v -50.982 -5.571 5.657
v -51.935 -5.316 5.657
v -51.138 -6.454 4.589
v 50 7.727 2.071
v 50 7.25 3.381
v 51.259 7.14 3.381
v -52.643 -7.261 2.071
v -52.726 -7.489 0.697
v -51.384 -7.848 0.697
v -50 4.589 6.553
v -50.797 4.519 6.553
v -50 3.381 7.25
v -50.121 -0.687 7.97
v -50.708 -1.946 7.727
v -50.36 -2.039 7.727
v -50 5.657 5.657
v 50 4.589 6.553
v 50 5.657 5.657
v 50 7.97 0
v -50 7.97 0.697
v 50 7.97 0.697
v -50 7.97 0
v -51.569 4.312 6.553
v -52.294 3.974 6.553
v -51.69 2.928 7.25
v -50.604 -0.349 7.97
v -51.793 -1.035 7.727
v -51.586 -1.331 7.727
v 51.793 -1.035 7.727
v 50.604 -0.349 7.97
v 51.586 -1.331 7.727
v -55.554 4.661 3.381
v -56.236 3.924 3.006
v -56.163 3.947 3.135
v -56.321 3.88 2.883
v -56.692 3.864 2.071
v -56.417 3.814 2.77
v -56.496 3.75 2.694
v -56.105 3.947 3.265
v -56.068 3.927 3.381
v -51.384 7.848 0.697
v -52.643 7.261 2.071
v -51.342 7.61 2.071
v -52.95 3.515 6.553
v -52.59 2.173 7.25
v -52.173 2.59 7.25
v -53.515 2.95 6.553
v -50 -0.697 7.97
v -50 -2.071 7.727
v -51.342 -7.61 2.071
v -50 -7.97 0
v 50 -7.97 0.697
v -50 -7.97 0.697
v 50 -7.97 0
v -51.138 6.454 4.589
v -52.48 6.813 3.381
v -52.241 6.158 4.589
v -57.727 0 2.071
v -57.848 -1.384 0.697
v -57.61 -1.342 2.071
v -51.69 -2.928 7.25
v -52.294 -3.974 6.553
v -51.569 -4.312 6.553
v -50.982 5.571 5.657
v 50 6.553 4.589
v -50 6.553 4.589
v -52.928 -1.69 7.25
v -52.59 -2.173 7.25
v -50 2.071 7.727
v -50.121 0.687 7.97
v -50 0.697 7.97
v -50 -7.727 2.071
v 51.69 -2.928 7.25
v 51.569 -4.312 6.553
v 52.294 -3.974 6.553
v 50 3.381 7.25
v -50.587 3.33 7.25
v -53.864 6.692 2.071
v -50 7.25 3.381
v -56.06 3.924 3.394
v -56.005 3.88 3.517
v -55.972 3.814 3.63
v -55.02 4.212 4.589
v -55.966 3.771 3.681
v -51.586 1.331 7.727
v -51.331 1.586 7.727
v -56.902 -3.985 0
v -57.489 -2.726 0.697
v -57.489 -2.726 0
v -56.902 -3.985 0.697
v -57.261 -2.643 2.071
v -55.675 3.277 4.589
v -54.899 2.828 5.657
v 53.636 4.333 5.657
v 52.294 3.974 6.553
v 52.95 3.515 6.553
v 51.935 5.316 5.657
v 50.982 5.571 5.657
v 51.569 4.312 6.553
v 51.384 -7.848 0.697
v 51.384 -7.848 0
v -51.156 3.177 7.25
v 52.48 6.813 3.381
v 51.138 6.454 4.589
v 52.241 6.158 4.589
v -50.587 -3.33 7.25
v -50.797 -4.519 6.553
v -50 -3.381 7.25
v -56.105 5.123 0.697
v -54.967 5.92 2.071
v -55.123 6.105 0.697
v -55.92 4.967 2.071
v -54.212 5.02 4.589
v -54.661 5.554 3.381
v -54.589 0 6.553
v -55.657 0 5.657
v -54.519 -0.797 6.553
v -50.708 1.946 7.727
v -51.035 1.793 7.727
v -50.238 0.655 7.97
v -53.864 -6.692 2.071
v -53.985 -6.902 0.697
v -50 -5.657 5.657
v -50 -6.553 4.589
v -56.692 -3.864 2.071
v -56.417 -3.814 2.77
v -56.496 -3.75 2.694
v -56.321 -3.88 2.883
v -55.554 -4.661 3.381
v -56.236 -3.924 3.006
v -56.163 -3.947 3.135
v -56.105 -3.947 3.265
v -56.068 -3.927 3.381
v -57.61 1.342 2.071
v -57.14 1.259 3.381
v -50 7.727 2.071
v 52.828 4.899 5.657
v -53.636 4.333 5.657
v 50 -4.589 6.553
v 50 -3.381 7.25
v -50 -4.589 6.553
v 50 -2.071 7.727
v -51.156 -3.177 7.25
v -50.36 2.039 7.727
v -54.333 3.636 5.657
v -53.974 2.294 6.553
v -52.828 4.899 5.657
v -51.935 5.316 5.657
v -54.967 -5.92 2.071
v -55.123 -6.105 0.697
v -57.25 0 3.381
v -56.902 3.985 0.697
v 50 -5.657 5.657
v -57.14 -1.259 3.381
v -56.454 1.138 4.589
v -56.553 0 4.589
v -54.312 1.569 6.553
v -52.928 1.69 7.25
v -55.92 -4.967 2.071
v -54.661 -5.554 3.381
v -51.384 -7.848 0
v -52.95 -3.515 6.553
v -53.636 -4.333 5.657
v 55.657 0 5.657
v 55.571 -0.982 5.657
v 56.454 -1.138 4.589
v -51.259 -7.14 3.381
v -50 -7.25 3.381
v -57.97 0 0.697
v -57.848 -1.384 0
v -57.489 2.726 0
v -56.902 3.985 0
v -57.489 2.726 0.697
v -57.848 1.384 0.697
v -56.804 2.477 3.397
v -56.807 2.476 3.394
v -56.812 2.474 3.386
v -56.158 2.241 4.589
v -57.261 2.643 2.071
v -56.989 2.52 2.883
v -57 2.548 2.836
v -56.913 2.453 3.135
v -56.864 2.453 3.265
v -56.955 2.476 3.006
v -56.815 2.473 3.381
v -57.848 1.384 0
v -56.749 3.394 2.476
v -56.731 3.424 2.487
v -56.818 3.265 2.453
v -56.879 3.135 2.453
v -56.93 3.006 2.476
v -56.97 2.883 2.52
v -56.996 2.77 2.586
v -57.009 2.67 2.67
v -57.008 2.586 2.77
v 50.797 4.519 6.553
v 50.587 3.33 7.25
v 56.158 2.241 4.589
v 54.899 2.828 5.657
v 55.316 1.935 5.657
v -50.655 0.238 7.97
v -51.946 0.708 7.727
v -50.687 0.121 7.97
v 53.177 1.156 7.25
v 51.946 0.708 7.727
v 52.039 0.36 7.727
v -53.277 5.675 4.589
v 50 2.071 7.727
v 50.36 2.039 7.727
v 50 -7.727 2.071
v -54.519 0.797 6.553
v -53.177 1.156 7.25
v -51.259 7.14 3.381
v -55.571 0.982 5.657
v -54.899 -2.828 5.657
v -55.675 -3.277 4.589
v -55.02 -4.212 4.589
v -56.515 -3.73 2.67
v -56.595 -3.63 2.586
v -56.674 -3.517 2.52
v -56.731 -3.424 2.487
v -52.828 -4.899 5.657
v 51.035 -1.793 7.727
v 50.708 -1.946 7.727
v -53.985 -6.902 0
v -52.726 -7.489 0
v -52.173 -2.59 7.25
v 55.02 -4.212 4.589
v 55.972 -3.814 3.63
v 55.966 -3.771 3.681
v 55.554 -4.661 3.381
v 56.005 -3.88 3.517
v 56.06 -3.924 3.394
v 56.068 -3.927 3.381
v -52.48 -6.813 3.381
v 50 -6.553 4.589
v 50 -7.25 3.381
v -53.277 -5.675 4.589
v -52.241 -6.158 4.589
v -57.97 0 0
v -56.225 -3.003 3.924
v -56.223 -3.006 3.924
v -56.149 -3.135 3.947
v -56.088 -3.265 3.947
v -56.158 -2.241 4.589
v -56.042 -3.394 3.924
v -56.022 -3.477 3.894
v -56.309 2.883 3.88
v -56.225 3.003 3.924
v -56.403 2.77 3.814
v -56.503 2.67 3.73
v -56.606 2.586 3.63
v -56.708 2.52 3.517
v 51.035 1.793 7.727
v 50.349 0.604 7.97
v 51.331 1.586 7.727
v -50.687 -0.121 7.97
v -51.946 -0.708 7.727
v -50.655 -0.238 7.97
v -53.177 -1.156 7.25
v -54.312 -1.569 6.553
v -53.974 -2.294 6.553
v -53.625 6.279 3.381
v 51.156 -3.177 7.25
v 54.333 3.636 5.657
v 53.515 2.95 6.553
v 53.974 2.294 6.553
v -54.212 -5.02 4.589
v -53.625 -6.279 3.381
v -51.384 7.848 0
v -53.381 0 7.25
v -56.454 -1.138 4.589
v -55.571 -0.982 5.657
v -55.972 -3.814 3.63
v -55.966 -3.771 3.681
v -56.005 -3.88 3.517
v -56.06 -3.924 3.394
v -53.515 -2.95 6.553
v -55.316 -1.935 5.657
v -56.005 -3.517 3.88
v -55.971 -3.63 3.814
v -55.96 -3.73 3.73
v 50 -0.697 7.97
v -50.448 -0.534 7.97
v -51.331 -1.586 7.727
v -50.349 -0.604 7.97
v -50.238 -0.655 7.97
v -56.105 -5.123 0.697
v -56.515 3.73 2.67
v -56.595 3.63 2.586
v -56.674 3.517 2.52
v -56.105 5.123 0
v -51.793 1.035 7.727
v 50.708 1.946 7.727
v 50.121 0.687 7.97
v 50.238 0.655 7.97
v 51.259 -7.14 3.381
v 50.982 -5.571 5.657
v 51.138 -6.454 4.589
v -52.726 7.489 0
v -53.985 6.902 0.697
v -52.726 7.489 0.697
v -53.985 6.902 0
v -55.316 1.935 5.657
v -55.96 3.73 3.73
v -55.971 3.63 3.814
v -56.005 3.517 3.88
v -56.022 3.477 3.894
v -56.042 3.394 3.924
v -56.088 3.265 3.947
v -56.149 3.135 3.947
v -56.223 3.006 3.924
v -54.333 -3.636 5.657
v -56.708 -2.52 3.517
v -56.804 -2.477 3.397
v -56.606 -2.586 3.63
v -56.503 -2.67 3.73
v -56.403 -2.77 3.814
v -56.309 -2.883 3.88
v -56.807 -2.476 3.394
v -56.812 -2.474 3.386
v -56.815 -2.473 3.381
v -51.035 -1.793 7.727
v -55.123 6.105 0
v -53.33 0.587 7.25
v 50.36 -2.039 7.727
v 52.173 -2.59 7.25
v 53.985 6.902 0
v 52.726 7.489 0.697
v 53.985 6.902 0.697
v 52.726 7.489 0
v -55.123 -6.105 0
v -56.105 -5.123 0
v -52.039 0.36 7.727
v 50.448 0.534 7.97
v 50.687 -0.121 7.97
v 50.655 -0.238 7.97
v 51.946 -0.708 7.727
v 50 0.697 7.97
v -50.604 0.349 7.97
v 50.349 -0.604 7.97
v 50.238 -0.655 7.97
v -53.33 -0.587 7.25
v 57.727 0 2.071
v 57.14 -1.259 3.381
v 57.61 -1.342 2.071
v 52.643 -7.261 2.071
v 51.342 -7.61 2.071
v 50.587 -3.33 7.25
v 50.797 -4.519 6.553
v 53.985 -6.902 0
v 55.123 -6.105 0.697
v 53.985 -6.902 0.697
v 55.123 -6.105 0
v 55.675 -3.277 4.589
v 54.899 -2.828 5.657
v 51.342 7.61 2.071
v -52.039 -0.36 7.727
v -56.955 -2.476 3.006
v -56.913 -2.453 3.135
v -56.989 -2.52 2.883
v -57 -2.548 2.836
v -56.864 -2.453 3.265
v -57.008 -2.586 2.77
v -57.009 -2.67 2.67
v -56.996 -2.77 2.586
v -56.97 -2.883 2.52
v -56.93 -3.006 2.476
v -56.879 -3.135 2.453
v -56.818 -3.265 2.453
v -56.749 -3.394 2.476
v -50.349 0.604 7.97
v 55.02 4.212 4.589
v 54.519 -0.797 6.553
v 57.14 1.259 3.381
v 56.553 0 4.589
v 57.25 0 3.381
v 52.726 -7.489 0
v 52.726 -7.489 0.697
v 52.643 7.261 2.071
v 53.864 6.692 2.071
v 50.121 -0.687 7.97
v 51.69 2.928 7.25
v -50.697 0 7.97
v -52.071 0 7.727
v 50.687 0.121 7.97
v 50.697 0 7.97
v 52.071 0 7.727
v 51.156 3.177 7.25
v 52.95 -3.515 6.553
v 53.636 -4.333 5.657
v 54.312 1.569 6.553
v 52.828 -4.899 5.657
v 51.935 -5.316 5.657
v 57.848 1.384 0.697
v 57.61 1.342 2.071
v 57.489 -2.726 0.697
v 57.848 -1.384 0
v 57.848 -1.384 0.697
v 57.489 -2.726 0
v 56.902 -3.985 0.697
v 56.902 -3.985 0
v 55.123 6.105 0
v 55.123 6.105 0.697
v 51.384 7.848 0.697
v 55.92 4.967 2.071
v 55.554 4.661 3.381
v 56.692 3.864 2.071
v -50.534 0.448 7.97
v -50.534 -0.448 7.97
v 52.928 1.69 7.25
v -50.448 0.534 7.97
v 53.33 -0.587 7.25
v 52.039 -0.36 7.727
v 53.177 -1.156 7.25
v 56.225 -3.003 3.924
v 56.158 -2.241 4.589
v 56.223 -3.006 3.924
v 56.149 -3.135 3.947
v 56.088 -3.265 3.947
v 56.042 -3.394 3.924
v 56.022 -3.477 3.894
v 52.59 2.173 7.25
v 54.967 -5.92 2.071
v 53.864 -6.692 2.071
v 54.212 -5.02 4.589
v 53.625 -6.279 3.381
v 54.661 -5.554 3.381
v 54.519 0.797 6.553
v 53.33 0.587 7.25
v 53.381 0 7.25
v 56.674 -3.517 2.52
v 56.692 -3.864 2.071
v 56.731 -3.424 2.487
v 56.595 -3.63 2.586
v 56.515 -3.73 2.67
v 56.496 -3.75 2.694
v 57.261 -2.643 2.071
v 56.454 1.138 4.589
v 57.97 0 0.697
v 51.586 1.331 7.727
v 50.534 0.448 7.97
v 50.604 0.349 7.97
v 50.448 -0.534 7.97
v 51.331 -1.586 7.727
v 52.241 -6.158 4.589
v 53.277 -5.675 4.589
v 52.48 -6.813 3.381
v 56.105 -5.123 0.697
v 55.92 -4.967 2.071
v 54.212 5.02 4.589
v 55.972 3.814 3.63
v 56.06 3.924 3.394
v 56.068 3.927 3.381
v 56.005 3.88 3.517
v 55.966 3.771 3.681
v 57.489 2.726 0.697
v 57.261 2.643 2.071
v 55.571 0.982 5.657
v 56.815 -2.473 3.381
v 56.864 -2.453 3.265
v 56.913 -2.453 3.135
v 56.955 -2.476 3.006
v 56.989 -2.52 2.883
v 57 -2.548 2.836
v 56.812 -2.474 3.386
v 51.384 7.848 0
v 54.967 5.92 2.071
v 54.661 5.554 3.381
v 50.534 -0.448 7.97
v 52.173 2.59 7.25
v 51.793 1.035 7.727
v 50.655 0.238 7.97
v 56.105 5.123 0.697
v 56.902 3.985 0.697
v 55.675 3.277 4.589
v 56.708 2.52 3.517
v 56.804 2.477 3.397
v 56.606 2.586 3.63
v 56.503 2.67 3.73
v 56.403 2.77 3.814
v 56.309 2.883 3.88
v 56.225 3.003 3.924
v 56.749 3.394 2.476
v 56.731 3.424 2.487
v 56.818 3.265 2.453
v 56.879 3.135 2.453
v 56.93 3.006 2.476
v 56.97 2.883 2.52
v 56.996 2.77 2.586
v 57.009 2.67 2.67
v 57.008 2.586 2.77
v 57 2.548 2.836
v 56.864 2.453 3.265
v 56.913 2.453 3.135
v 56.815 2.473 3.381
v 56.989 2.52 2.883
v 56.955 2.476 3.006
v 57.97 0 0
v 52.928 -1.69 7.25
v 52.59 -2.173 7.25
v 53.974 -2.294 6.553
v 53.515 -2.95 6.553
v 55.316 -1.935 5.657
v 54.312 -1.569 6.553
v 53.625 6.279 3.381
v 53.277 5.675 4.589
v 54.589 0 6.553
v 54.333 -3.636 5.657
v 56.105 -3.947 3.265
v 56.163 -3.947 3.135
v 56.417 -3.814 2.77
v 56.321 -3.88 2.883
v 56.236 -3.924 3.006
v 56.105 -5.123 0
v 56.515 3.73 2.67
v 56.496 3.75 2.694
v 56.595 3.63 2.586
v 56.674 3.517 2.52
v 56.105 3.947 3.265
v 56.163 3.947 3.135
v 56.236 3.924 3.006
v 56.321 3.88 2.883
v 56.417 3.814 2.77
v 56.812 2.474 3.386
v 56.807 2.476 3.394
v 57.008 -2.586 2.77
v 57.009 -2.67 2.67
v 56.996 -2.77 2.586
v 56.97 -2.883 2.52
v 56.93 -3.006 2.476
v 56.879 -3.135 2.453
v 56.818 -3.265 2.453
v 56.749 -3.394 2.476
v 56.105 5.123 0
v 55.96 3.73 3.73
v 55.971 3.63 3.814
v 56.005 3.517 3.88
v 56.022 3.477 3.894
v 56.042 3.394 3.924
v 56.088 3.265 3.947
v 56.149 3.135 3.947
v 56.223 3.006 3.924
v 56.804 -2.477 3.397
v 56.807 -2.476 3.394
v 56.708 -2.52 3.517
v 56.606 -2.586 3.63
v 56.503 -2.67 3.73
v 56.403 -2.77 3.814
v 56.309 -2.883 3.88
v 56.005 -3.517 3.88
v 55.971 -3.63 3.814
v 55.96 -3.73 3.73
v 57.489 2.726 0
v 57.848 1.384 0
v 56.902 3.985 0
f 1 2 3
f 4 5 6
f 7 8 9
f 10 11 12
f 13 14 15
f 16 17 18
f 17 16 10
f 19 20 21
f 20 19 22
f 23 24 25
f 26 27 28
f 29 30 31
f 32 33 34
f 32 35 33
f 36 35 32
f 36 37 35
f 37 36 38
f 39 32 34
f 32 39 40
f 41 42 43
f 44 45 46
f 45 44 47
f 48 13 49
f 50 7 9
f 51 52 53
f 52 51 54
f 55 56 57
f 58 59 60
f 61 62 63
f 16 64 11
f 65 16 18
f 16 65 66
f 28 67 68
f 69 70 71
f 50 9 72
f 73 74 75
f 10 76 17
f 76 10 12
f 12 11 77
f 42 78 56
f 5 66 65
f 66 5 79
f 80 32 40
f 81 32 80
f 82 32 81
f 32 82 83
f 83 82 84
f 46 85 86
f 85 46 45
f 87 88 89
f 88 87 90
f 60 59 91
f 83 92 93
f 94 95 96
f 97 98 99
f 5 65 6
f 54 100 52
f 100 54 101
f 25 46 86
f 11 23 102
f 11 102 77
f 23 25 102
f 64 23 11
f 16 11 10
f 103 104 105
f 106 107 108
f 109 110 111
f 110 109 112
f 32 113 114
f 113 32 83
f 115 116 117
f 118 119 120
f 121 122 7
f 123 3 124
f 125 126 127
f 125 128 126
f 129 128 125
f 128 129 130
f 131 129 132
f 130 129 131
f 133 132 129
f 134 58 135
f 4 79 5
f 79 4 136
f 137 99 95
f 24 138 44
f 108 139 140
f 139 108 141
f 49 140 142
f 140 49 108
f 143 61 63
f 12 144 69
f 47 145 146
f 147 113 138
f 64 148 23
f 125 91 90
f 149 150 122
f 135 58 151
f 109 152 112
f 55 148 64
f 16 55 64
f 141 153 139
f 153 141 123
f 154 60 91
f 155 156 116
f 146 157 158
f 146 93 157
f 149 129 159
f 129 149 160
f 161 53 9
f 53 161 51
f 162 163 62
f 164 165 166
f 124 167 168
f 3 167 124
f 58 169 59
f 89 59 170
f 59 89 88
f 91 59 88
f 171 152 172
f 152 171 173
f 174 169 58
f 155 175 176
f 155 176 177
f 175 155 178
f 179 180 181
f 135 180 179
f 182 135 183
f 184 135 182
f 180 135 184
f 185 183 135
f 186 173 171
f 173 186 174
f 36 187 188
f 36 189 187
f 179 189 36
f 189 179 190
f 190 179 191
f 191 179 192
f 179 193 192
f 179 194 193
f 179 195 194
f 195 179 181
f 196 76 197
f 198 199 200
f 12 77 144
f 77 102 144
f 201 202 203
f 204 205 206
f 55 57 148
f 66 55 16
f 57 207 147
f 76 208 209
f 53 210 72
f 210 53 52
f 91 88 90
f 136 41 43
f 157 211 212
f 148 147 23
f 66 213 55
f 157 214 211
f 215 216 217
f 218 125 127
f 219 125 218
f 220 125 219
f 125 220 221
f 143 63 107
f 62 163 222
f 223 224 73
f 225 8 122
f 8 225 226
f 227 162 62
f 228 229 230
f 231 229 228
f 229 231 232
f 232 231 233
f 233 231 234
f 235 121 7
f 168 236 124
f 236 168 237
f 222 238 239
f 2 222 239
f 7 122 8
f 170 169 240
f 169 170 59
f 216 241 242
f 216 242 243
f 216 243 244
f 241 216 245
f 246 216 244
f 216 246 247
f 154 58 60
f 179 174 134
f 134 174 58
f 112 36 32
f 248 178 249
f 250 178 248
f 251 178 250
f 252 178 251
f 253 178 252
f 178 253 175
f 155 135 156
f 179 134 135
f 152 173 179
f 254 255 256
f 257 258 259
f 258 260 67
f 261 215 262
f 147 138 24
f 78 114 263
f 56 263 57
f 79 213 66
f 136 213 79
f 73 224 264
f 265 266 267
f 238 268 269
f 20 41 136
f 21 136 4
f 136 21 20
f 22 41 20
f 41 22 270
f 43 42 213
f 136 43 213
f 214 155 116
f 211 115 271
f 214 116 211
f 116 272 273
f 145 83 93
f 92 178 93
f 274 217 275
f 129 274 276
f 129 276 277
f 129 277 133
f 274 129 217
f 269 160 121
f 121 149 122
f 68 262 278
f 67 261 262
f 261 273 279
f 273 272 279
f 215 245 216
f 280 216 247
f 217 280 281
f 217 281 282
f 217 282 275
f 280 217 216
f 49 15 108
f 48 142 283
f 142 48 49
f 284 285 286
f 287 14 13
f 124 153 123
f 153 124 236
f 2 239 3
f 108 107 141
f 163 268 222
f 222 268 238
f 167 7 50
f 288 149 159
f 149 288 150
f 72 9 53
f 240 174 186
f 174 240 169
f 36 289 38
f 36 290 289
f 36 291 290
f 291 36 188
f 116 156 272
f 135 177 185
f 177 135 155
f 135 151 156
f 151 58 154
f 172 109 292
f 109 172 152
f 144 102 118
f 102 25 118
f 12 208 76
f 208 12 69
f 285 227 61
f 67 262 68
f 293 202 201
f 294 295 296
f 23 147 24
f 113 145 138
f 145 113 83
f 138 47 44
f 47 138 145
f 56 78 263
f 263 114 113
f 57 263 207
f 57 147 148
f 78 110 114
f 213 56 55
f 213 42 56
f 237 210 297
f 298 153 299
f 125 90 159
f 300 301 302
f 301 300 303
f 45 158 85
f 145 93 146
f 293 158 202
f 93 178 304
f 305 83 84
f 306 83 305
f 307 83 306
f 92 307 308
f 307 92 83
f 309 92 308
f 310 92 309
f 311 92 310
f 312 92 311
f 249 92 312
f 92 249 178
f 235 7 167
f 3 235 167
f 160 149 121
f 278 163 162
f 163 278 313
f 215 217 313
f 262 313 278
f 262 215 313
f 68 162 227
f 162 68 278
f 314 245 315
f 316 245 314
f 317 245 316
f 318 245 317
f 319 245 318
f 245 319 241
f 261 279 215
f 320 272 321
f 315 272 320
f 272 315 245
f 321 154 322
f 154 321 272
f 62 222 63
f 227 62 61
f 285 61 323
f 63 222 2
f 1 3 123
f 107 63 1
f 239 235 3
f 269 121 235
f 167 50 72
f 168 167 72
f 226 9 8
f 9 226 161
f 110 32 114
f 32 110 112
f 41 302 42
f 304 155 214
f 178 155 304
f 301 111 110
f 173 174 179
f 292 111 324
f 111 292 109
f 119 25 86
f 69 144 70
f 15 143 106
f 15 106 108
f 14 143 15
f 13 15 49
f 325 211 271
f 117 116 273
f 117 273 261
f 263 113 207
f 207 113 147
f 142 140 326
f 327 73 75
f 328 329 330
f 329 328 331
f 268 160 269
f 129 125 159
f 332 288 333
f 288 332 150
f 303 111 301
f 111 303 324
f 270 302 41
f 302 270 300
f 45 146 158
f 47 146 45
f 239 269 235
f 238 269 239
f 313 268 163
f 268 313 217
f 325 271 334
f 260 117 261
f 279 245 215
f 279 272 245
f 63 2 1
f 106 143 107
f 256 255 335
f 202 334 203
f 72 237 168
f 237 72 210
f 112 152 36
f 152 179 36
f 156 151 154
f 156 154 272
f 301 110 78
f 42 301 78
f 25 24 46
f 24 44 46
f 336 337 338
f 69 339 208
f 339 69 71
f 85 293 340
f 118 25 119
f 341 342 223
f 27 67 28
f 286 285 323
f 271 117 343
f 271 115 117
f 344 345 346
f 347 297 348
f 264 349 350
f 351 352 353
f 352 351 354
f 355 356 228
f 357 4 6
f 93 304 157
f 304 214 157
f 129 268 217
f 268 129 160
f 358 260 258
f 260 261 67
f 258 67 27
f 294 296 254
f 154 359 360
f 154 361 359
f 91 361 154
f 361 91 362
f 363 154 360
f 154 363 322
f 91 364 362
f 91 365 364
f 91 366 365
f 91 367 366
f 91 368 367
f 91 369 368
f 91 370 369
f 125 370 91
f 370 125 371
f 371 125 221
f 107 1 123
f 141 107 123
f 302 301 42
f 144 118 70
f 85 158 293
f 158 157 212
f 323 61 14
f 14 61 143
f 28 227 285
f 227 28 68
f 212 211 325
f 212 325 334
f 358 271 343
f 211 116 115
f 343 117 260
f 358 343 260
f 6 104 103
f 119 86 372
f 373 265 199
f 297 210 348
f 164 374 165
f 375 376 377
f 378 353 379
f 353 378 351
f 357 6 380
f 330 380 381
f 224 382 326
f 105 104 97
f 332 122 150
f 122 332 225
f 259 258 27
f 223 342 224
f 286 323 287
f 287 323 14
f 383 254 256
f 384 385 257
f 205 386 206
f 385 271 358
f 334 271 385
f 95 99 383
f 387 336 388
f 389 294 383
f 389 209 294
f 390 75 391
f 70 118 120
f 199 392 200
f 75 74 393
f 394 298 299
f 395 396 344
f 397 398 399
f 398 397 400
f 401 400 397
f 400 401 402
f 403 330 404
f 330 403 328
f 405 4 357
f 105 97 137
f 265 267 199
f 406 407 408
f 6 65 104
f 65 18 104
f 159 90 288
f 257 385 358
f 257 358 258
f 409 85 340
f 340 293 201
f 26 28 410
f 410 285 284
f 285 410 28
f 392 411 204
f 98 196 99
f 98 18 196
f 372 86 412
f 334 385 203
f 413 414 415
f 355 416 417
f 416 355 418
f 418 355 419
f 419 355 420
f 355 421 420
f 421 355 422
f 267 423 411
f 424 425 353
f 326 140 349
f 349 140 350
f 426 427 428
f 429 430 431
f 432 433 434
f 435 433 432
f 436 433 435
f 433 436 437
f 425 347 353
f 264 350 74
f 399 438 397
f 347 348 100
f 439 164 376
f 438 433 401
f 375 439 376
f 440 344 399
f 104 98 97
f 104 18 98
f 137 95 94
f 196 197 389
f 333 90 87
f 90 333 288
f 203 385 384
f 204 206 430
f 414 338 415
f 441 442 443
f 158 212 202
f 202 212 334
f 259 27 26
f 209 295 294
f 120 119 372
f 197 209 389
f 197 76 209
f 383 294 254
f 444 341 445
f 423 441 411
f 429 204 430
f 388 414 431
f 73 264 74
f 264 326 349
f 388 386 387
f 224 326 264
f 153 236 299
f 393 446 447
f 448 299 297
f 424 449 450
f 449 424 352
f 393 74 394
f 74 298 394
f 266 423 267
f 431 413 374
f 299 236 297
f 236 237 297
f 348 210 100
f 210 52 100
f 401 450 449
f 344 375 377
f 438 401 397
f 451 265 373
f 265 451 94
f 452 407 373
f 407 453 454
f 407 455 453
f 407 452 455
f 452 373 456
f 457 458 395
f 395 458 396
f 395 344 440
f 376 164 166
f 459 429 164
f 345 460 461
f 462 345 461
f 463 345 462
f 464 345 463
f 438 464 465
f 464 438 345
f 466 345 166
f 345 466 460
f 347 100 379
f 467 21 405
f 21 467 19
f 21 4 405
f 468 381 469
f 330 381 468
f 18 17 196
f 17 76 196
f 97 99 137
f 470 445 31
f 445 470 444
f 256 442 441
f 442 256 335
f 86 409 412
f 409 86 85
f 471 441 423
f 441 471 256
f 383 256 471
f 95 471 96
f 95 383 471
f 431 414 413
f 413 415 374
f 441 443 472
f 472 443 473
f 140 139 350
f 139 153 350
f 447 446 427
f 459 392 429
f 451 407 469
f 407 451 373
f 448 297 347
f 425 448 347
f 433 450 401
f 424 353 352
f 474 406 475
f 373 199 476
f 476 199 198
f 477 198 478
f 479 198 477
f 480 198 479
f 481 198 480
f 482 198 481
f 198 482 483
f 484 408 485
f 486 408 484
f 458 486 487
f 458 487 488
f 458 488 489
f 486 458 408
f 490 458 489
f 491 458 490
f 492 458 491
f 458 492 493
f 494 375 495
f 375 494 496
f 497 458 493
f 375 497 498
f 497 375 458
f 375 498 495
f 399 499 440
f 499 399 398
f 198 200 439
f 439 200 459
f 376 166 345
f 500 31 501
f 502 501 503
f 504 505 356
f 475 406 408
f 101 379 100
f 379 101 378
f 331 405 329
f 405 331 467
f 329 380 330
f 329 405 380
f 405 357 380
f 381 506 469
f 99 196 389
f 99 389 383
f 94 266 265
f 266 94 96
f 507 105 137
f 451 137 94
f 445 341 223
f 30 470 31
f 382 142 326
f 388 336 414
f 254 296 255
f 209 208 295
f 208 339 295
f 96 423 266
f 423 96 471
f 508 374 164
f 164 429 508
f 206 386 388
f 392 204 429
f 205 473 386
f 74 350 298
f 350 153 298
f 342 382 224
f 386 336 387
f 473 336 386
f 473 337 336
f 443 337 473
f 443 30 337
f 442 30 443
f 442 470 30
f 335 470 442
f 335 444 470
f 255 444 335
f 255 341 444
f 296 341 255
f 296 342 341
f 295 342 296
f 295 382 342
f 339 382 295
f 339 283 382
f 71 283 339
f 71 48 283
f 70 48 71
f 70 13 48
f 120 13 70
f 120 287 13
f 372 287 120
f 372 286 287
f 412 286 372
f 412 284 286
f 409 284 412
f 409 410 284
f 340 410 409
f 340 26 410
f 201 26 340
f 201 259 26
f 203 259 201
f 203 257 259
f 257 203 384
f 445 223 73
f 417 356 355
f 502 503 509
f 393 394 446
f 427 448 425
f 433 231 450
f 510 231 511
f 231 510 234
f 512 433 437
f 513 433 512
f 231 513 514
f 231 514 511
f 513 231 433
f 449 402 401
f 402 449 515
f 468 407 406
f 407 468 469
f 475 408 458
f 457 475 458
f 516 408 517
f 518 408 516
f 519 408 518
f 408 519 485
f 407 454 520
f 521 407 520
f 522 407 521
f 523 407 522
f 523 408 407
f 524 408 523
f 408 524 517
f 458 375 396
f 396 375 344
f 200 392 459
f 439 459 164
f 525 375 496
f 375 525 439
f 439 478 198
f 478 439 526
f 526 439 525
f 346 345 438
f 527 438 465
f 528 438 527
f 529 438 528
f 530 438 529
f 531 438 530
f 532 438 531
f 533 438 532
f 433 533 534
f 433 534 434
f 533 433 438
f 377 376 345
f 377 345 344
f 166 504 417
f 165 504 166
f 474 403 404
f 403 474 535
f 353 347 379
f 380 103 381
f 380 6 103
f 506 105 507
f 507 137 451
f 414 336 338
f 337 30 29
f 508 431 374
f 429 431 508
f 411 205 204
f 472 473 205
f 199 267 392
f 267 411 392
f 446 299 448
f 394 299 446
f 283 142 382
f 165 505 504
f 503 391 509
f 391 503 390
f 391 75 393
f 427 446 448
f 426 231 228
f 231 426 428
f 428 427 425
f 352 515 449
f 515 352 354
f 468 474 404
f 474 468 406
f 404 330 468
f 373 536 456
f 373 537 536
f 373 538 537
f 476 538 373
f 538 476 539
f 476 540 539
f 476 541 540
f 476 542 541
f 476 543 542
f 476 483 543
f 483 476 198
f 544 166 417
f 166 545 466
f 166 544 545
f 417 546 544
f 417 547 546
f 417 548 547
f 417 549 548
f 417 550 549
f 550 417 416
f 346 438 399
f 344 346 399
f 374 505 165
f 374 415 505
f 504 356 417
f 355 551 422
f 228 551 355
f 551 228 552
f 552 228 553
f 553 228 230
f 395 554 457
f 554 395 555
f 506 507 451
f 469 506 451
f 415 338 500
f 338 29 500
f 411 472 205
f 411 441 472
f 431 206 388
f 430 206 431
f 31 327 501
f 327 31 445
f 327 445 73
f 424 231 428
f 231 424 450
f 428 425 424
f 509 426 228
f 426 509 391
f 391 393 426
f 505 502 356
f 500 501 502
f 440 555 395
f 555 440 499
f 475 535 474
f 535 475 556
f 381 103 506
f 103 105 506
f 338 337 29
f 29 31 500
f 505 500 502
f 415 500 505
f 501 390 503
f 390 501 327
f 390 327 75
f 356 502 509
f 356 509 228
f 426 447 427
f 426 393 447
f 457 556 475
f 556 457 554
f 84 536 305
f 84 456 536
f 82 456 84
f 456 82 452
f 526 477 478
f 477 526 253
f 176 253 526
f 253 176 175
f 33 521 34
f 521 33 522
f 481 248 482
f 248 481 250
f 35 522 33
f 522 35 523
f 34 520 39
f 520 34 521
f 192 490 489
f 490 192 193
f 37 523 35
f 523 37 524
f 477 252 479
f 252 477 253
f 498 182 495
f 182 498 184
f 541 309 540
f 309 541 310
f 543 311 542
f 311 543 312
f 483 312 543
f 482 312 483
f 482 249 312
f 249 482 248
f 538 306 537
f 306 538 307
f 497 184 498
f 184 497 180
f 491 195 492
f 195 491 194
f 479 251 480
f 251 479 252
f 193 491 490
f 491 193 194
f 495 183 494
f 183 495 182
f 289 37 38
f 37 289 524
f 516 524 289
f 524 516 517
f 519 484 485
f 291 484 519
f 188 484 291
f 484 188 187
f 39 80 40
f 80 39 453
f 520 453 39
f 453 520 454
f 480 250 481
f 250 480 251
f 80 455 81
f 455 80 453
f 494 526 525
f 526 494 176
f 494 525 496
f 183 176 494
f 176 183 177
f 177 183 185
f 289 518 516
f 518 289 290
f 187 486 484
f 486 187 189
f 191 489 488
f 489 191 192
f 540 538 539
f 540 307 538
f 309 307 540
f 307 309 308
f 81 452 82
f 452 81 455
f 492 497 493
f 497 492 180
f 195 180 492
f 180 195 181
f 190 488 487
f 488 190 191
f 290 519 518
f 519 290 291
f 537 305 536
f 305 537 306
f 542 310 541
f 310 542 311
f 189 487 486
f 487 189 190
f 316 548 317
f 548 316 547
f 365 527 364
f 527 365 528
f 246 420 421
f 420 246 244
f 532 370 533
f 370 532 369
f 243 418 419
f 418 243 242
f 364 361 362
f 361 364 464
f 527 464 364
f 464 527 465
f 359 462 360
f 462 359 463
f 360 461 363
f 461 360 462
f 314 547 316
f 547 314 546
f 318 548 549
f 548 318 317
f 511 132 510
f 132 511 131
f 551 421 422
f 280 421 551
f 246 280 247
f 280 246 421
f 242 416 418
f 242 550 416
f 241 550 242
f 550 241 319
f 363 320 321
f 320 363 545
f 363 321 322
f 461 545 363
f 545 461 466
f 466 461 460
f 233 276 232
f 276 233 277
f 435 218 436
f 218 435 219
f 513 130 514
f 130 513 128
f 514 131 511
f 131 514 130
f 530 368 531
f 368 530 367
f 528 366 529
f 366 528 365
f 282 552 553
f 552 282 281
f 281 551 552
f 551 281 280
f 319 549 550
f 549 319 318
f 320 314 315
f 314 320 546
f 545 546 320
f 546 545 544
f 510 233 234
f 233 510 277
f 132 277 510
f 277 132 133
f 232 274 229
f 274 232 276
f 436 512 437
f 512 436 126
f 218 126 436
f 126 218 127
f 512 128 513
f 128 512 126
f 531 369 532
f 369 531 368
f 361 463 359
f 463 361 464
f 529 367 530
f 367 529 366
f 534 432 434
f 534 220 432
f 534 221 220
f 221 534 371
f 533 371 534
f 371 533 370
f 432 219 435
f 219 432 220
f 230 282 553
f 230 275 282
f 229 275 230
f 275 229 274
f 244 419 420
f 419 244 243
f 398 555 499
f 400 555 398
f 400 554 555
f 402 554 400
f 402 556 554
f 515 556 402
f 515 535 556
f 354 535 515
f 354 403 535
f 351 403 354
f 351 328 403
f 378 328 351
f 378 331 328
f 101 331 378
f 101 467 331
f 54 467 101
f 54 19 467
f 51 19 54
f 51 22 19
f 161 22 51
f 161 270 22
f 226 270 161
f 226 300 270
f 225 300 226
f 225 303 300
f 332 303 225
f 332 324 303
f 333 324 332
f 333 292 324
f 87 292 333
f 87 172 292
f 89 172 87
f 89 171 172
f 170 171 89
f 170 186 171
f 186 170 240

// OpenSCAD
$fn=36;
length=100;
width=16;
wire_radius=0.75;


difference()
    {
    union()
        {
        hull()
            {
            translate([-length/2,0,0])
                sphere(r=width/2);

            translate([length/2,0,0])
                sphere(r=width/2);
            
            }



        }
        translate([0,width/5,width/5])
        hull()
            {
            translate([-length,0,0])
                sphere(r=wire_radius);

            translate([length,0,0])
                sphere(r=wire_radius);
            
            }

        translate([0,-width/5,width/5])
        hull()
            {
            translate([-length,0,0])
                sphere(r=wire_radius);

            translate([length,0,0])
                sphere(r=wire_radius);
            
            }

        translate([-length,-width,-width*2])
            cube([length*2,width*2,width*2]);

    }
